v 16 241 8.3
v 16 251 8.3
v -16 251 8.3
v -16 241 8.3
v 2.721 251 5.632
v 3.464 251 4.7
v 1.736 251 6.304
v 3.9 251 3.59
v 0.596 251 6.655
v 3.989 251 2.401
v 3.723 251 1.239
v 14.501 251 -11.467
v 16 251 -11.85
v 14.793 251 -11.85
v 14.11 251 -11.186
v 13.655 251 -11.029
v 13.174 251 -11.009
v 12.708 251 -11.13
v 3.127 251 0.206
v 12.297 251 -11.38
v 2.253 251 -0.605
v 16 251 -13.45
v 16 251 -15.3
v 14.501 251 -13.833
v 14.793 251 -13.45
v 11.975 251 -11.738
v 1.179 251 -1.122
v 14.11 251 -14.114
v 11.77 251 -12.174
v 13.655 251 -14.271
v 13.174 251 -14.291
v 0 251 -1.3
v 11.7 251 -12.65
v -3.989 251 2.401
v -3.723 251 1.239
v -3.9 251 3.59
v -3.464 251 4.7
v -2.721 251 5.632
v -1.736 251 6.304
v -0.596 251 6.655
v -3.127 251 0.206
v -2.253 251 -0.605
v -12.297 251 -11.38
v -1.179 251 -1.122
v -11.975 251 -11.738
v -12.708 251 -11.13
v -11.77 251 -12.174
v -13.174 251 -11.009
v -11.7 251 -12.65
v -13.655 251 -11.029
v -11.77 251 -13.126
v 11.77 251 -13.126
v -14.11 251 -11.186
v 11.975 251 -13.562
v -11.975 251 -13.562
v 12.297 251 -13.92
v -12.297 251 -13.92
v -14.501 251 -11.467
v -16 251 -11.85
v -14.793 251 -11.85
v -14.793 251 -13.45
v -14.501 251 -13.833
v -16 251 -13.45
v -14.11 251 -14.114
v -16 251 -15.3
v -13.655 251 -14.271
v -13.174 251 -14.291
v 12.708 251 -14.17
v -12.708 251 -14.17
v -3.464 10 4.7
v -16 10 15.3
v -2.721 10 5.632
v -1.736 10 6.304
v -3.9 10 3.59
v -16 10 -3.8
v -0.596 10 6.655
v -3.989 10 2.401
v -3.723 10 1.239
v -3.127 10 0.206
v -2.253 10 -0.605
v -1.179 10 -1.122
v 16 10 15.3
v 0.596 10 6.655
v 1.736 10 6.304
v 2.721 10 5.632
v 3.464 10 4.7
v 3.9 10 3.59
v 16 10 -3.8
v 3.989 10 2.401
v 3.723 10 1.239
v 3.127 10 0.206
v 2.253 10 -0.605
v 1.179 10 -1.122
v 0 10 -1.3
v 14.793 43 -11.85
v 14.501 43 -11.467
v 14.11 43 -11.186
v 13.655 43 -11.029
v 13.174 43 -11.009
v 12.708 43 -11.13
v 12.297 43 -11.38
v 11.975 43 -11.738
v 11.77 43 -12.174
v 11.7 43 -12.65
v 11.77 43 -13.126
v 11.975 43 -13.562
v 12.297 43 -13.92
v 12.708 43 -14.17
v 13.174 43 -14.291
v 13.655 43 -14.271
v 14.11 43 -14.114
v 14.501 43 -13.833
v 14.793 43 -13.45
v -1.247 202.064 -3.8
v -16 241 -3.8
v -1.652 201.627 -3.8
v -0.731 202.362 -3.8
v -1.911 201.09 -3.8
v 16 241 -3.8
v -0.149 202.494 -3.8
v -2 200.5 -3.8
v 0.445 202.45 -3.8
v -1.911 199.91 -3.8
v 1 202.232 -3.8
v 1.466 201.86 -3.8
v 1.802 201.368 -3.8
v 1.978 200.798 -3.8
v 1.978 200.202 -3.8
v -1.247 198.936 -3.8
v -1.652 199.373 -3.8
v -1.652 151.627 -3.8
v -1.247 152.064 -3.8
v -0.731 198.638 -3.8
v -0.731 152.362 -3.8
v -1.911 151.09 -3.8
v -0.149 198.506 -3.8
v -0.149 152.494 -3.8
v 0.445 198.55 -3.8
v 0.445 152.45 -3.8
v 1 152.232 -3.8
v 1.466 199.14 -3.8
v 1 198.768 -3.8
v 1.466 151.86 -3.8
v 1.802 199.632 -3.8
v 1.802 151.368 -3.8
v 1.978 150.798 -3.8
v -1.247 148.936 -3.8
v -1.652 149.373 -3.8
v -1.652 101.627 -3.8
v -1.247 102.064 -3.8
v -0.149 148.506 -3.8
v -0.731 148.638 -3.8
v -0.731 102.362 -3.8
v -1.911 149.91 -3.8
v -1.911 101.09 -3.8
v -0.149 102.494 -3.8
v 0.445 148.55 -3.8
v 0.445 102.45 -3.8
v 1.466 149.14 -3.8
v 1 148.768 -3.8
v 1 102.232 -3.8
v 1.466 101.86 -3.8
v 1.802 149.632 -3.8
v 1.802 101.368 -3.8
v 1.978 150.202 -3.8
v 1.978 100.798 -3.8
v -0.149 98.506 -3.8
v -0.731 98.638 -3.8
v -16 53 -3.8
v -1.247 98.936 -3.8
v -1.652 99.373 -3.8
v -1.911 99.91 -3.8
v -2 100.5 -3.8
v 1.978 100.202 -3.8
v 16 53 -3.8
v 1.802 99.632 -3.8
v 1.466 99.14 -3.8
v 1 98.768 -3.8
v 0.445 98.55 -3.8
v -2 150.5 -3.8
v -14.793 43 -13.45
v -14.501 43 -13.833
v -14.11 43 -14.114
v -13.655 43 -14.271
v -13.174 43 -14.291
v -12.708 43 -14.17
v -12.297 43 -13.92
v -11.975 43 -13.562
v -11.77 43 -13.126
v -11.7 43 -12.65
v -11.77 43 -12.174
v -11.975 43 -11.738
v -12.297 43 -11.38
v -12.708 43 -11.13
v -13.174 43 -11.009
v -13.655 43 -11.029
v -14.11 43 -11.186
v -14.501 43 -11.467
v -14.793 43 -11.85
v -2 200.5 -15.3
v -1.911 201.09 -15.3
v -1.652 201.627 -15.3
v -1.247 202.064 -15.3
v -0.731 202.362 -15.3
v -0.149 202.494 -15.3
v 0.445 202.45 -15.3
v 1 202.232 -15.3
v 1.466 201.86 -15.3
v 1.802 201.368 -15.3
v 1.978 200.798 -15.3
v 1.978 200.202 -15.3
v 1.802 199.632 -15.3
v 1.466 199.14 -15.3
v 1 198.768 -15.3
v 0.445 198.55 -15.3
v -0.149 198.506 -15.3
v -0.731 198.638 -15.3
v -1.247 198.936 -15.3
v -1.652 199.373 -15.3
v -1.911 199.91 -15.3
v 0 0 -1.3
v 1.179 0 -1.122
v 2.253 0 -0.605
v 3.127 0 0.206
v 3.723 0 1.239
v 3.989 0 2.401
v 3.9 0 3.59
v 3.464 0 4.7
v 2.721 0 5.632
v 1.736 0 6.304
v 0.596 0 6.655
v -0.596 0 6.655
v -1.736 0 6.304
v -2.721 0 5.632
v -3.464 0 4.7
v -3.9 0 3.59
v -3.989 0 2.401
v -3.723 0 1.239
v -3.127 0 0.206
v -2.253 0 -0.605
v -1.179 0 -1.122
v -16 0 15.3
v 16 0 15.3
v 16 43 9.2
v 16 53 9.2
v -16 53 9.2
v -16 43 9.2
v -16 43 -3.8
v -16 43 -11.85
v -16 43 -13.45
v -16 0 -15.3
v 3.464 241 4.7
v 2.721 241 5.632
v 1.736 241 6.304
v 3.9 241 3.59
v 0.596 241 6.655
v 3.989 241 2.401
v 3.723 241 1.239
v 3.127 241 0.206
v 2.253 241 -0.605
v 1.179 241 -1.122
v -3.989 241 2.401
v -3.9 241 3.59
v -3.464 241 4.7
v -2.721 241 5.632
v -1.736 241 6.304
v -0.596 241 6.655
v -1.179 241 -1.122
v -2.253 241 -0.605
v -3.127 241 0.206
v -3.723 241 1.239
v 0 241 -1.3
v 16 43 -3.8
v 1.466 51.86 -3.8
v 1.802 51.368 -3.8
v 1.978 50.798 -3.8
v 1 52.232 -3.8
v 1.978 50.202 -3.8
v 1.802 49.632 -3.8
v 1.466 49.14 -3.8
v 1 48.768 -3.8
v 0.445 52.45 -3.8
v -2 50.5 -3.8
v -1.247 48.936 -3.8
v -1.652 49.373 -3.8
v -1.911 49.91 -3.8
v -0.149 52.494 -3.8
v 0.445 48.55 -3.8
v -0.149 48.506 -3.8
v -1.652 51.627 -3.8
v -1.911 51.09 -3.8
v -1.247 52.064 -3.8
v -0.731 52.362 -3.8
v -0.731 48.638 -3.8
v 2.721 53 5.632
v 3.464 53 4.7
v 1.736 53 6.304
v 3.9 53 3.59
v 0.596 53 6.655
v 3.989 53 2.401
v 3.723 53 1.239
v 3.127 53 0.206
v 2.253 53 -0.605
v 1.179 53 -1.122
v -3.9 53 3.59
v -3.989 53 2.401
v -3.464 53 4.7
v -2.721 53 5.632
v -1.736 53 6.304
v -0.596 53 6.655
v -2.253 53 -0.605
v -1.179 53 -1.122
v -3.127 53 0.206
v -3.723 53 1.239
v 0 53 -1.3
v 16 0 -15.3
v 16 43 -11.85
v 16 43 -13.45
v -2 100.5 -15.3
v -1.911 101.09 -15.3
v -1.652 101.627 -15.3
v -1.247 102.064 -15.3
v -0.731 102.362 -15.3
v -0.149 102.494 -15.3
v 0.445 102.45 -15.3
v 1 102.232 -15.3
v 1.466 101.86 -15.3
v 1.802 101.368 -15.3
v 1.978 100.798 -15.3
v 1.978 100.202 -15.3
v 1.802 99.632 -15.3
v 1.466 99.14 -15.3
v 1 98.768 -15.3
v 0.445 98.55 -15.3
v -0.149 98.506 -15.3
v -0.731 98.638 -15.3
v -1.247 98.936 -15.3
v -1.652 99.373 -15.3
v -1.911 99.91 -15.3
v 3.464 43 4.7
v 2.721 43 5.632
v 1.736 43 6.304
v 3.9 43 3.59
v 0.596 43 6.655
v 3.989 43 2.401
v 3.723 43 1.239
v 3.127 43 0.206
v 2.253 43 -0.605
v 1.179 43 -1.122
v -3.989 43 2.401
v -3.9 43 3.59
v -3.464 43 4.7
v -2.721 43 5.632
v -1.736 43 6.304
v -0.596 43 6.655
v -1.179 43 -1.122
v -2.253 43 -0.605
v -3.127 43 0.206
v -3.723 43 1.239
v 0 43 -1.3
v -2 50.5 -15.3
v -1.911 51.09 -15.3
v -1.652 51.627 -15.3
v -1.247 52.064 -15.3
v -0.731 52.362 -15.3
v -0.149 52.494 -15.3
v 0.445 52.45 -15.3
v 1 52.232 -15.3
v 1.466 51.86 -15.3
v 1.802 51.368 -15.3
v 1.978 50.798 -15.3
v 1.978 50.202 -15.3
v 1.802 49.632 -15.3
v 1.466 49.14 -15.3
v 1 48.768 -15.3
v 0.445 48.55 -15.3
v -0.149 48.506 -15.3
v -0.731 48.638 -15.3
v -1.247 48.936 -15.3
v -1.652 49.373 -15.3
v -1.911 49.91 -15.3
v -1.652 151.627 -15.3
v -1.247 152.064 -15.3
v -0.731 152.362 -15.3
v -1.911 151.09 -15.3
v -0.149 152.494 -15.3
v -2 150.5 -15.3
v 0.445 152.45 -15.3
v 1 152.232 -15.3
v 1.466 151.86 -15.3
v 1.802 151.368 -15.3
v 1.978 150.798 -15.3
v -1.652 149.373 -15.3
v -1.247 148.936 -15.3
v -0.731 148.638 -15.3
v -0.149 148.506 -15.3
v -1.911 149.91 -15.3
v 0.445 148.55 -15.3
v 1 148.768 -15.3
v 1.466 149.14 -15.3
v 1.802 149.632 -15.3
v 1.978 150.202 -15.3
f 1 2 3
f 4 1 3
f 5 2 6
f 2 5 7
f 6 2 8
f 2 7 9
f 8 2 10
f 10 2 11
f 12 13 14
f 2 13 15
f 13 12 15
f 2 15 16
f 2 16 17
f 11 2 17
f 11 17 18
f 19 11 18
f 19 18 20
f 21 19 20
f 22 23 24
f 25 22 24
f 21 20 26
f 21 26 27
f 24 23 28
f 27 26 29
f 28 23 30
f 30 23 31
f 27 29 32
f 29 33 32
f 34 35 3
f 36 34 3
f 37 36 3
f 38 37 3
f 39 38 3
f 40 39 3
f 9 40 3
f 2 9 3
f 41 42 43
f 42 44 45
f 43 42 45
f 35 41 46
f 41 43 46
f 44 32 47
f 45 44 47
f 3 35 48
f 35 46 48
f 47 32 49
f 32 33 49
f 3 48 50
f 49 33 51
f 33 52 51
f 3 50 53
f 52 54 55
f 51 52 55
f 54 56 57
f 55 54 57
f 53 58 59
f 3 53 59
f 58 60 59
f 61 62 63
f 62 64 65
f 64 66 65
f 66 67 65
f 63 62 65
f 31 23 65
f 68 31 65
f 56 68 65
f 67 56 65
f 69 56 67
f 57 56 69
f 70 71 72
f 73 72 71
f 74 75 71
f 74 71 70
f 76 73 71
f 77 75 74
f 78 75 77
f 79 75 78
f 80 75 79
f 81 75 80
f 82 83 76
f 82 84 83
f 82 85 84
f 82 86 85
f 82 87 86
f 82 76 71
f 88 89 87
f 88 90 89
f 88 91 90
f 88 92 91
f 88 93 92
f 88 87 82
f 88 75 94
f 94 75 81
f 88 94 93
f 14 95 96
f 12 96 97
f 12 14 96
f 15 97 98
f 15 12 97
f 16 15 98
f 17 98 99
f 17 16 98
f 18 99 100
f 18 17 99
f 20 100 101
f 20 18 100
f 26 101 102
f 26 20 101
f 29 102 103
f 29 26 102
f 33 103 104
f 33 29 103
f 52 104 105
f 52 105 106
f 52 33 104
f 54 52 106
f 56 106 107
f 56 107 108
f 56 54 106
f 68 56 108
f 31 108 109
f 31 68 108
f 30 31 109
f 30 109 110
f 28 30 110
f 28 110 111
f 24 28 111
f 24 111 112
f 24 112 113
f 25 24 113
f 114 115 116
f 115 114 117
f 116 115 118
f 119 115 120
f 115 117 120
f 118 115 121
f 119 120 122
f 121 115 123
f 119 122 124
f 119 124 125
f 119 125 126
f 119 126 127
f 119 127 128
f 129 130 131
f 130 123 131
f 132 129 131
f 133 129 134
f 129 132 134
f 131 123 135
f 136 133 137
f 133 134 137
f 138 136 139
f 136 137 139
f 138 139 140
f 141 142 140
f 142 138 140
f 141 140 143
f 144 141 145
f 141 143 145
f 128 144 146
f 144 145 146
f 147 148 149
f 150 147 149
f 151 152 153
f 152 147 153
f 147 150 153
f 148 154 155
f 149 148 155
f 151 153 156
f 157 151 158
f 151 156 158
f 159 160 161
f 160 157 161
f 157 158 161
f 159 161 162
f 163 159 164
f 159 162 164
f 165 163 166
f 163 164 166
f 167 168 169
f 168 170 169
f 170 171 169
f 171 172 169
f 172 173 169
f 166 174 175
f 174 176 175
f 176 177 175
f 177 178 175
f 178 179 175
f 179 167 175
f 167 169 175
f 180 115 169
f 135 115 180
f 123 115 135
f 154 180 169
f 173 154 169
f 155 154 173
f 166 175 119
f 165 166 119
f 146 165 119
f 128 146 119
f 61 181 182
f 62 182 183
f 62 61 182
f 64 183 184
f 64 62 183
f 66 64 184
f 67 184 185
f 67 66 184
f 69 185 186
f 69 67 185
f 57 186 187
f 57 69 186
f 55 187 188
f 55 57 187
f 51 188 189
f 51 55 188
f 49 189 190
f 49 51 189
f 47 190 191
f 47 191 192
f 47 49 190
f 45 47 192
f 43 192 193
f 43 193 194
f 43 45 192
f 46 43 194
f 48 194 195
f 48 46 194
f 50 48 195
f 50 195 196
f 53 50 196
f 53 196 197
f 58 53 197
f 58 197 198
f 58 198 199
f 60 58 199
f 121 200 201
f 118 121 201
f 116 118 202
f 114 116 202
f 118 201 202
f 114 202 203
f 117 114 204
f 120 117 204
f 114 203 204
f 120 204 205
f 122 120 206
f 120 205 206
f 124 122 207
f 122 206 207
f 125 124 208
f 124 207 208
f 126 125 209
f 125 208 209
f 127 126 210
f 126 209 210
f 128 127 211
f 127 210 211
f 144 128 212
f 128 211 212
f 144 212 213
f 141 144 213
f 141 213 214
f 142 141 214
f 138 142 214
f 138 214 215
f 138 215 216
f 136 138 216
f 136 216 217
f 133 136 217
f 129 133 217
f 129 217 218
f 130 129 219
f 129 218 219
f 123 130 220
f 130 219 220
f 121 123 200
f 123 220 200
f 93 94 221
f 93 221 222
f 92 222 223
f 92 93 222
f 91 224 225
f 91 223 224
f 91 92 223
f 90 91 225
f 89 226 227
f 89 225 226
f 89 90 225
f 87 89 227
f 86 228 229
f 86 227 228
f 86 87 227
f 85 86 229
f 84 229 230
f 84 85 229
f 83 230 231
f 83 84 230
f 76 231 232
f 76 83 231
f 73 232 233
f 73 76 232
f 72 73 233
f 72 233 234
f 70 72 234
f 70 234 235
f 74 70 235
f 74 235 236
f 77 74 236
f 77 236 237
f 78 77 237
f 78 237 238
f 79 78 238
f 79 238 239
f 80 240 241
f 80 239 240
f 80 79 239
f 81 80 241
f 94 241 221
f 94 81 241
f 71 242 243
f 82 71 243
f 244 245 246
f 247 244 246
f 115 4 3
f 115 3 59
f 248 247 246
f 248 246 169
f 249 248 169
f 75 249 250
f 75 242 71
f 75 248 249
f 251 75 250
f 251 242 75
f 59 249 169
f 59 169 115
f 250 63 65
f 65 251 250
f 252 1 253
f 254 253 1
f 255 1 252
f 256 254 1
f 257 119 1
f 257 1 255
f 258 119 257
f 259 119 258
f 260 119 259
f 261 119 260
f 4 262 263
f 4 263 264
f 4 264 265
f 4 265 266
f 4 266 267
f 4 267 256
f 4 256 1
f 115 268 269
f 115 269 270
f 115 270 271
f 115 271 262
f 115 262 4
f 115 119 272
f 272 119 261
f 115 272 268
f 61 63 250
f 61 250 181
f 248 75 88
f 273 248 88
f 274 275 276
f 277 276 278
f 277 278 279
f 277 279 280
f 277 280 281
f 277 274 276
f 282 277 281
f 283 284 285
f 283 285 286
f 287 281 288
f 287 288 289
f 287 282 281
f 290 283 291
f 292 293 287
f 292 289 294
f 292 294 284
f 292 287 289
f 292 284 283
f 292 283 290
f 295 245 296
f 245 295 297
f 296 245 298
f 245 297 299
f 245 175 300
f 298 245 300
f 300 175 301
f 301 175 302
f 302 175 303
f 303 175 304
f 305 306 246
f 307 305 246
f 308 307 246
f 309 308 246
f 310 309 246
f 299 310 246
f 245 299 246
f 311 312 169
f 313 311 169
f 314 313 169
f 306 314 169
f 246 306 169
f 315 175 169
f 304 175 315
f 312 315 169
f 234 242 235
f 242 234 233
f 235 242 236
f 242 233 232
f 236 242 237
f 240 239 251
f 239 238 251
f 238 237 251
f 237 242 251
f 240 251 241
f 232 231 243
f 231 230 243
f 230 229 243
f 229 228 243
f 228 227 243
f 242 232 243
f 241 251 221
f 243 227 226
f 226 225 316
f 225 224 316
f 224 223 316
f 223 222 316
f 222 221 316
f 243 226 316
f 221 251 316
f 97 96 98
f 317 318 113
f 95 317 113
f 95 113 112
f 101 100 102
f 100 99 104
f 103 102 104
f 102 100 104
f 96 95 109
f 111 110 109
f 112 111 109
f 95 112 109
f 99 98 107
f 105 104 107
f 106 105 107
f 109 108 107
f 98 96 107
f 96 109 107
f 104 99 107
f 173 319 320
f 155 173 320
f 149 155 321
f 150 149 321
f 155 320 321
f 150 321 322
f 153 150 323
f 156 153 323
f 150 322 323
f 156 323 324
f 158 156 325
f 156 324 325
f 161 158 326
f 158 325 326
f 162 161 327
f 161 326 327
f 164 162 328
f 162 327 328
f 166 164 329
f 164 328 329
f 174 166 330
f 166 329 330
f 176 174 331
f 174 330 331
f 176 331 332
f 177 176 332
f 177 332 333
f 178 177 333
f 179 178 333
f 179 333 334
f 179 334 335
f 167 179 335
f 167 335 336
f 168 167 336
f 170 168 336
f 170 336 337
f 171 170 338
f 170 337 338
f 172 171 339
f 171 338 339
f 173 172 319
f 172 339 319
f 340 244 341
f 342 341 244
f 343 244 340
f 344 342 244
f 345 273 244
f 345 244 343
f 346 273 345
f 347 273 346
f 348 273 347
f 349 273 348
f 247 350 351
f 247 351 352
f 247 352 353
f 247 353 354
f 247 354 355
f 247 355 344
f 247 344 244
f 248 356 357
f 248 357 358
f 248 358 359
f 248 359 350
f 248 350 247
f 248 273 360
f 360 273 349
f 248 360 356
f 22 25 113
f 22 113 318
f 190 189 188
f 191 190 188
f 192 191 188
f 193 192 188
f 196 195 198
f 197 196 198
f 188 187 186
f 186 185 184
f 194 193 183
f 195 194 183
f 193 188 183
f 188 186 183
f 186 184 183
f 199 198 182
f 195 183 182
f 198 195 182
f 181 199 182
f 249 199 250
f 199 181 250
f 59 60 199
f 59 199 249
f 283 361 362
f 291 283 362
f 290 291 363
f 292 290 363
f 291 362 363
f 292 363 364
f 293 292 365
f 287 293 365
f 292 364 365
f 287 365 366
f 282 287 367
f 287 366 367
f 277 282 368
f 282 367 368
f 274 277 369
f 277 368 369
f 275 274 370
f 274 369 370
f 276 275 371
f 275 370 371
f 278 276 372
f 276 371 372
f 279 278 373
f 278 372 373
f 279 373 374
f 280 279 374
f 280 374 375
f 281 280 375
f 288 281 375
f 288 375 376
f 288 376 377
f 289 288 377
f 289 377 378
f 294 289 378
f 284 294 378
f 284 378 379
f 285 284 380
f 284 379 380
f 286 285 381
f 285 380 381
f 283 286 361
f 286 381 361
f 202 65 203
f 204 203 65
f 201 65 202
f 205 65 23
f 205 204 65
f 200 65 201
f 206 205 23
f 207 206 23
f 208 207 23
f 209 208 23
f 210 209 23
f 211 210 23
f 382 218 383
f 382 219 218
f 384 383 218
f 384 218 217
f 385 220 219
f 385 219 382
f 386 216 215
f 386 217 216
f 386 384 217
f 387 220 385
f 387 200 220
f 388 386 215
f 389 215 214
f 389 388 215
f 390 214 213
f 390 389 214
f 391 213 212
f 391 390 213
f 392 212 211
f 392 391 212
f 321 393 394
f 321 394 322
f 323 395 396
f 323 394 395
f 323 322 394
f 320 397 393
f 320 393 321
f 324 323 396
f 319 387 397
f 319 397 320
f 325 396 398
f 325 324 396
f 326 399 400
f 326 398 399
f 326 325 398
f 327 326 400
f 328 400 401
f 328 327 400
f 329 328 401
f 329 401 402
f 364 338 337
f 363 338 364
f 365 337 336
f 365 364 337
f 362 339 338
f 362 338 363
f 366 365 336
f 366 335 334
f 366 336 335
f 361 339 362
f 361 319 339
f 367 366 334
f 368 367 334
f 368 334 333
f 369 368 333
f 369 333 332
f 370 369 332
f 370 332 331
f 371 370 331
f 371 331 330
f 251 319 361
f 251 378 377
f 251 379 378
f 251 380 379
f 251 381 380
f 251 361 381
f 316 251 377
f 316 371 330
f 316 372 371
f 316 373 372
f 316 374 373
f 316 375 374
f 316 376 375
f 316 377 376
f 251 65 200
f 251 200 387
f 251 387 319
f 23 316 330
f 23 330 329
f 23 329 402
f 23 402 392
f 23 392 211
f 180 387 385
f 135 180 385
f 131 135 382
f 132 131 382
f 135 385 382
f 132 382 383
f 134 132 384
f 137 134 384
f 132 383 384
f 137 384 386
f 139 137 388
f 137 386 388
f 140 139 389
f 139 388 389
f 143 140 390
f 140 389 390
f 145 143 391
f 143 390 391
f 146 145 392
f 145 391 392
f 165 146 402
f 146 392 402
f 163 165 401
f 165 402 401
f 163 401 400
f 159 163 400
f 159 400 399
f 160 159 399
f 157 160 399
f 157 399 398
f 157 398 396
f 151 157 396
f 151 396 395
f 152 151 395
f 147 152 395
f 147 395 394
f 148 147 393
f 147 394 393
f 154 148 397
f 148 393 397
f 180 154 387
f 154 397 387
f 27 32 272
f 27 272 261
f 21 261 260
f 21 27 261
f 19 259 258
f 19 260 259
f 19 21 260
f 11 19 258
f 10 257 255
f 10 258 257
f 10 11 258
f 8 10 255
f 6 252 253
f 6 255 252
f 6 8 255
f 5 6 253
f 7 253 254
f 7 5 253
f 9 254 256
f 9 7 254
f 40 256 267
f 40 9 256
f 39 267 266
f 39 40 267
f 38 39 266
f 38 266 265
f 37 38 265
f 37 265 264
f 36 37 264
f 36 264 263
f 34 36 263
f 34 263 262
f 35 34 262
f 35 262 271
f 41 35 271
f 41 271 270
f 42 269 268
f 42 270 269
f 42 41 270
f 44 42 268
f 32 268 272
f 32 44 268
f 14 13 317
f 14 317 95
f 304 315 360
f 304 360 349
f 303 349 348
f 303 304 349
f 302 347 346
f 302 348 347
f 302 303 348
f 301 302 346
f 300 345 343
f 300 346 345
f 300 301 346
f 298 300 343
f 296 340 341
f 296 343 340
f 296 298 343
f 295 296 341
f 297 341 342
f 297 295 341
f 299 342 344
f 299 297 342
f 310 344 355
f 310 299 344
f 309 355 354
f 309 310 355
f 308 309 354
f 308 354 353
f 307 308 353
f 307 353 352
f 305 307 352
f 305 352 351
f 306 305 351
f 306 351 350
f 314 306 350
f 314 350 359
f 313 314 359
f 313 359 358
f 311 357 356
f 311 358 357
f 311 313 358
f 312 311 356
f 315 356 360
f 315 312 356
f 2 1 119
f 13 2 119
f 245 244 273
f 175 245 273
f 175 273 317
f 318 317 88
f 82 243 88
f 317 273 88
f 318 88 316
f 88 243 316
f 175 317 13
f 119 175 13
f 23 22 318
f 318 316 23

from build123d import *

# Parameters (mm, degrees)
SKETCH1_W               = 32
SKETCH1_H               = 30.6
BOSS_EXTRUDE1_DEPTH     = 10
SKETCH3_W               = 32
SKETCH3_H               = 23.6
BOSS_EXTRUDE2_DEPTH     = 10
SKETCH2_W               = 32
SKETCH2_H               = 11.5
BOSS_EXTRUDE3_DEPTH     = 231
SKETCH4_W               = 32
SKETCH4_H               = 13
BOSS_EXTRUDE4_DEPTH     = 10
CUT_EXTRUDE1_DEPTH      = 210.174783375
CUT_EXTRUDE1_DEPTH_BACK = 210.174783375
SKETCH5_R               = 4
SKETCH6_R               = 2
CUT_EXTRUDE2_DEPTH      = 11.5
CUT_EXTRUDE3_DEPTH      = 208


with BuildPart() as part:
    # Sketch1 → Boss-Extrude1 (new body)
    with BuildSketch(Plane(origin=(0, 0, 0), x_dir=(1, 0, 0), z_dir=(0, 1, 0))):
        Rectangle(SKETCH1_W, SKETCH1_H)
    extrude(amount=BOSS_EXTRUDE1_DEPTH)



with BuildPart() as body_2:
    # Sketch3 → Boss-Extrude2 (new body)
    with BuildSketch(Plane(origin=(0, 251, 0), x_dir=(-1, 0, 0), z_dir=(0, -1, 0))):
        with Locations((0, 3.5)):
            Rectangle(SKETCH3_W, SKETCH3_H)
    extrude(amount=BOSS_EXTRUDE2_DEPTH)


with BuildPart() as part_1:
    add(part.part)

    add(body_2.part)  # Boss-Extrude3 merges body 2
    # Sketch2 → Boss-Extrude3 (add)
    with BuildSketch(Plane(origin=(0, 10, 0), x_dir=(1, 0, 0), z_dir=(0, 1, 0))):
        with Locations((0, 9.55)):
            Rectangle(SKETCH2_W, SKETCH2_H)
    extrude(amount=BOSS_EXTRUDE3_DEPTH)

    # Sketch4 → Boss-Extrude4 (add)
    with BuildSketch(Plane(origin=(0, 53, 0), x_dir=(-1, 0, 0), z_dir=(0, -1, 0))):
        with Locations((0, -2.7)):
            Rectangle(SKETCH4_W, SKETCH4_H)
    extrude(amount=BOSS_EXTRUDE4_DEPTH)

    # Sketch5 → Cut-Extrude1 (cut, two sides: drawn at the far end of the back side and taken through both)
    with BuildSketch(Plane.XZ.offset(-43).offset(-CUT_EXTRUDE1_DEPTH_BACK)):
        with Locations(Location((0, 2.7, 0), (0, 0, 270))):
            Circle(SKETCH5_R)
    extrude(amount=CUT_EXTRUDE1_DEPTH + CUT_EXTRUDE1_DEPTH_BACK, mode=Mode.SUBTRACT)

    # Sketch6 → Cut-Extrude2 (cut)
    with BuildSketch(Plane(origin=(0, 0, -15.3), x_dir=(-1, 0, 0), z_dir=(0, 0, -1))):
        with Locations((0, 50.5)):
            Circle(SKETCH6_R)
        with Locations((0, 100.5)):
            Circle(SKETCH6_R)
        with Locations((0, 150.5)):
            Circle(SKETCH6_R)
        with Locations((0, 200.5)):
            Circle(SKETCH6_R)
    extrude(amount=-CUT_EXTRUDE2_DEPTH, mode=Mode.SUBTRACT)

    # Sketch7 → Cut-Extrude3 (cut)
    with BuildSketch(Plane(origin=(0, 251, 0), x_dir=(1, 0, 0), z_dir=(0, 1, 0))):
        with BuildLine():
            Line((-16, 11.85), (-16, 13.45))
            Line((-16, 13.45), (-14.793086969, 13.45))
            ThreePointArc((-14.793086969, 13.45), (-11.7, 12.65), (-14.793086969, 11.85))
            Line((-14.793086969, 11.85), (-16, 11.85))
        make_face()
        with BuildLine():
            Line((14.793086969, 13.45), (16, 13.45))
            Line((16, 13.45), (16, 11.85))
            Line((16, 11.85), (14.793086969, 11.85))
            ThreePointArc((14.793086969, 11.85), (11.7, 12.65), (14.793086969, 13.45))
        make_face()
    extrude(amount=-CUT_EXTRUDE3_DEPTH, mode=Mode.SUBTRACT)


solid = part_1.part
